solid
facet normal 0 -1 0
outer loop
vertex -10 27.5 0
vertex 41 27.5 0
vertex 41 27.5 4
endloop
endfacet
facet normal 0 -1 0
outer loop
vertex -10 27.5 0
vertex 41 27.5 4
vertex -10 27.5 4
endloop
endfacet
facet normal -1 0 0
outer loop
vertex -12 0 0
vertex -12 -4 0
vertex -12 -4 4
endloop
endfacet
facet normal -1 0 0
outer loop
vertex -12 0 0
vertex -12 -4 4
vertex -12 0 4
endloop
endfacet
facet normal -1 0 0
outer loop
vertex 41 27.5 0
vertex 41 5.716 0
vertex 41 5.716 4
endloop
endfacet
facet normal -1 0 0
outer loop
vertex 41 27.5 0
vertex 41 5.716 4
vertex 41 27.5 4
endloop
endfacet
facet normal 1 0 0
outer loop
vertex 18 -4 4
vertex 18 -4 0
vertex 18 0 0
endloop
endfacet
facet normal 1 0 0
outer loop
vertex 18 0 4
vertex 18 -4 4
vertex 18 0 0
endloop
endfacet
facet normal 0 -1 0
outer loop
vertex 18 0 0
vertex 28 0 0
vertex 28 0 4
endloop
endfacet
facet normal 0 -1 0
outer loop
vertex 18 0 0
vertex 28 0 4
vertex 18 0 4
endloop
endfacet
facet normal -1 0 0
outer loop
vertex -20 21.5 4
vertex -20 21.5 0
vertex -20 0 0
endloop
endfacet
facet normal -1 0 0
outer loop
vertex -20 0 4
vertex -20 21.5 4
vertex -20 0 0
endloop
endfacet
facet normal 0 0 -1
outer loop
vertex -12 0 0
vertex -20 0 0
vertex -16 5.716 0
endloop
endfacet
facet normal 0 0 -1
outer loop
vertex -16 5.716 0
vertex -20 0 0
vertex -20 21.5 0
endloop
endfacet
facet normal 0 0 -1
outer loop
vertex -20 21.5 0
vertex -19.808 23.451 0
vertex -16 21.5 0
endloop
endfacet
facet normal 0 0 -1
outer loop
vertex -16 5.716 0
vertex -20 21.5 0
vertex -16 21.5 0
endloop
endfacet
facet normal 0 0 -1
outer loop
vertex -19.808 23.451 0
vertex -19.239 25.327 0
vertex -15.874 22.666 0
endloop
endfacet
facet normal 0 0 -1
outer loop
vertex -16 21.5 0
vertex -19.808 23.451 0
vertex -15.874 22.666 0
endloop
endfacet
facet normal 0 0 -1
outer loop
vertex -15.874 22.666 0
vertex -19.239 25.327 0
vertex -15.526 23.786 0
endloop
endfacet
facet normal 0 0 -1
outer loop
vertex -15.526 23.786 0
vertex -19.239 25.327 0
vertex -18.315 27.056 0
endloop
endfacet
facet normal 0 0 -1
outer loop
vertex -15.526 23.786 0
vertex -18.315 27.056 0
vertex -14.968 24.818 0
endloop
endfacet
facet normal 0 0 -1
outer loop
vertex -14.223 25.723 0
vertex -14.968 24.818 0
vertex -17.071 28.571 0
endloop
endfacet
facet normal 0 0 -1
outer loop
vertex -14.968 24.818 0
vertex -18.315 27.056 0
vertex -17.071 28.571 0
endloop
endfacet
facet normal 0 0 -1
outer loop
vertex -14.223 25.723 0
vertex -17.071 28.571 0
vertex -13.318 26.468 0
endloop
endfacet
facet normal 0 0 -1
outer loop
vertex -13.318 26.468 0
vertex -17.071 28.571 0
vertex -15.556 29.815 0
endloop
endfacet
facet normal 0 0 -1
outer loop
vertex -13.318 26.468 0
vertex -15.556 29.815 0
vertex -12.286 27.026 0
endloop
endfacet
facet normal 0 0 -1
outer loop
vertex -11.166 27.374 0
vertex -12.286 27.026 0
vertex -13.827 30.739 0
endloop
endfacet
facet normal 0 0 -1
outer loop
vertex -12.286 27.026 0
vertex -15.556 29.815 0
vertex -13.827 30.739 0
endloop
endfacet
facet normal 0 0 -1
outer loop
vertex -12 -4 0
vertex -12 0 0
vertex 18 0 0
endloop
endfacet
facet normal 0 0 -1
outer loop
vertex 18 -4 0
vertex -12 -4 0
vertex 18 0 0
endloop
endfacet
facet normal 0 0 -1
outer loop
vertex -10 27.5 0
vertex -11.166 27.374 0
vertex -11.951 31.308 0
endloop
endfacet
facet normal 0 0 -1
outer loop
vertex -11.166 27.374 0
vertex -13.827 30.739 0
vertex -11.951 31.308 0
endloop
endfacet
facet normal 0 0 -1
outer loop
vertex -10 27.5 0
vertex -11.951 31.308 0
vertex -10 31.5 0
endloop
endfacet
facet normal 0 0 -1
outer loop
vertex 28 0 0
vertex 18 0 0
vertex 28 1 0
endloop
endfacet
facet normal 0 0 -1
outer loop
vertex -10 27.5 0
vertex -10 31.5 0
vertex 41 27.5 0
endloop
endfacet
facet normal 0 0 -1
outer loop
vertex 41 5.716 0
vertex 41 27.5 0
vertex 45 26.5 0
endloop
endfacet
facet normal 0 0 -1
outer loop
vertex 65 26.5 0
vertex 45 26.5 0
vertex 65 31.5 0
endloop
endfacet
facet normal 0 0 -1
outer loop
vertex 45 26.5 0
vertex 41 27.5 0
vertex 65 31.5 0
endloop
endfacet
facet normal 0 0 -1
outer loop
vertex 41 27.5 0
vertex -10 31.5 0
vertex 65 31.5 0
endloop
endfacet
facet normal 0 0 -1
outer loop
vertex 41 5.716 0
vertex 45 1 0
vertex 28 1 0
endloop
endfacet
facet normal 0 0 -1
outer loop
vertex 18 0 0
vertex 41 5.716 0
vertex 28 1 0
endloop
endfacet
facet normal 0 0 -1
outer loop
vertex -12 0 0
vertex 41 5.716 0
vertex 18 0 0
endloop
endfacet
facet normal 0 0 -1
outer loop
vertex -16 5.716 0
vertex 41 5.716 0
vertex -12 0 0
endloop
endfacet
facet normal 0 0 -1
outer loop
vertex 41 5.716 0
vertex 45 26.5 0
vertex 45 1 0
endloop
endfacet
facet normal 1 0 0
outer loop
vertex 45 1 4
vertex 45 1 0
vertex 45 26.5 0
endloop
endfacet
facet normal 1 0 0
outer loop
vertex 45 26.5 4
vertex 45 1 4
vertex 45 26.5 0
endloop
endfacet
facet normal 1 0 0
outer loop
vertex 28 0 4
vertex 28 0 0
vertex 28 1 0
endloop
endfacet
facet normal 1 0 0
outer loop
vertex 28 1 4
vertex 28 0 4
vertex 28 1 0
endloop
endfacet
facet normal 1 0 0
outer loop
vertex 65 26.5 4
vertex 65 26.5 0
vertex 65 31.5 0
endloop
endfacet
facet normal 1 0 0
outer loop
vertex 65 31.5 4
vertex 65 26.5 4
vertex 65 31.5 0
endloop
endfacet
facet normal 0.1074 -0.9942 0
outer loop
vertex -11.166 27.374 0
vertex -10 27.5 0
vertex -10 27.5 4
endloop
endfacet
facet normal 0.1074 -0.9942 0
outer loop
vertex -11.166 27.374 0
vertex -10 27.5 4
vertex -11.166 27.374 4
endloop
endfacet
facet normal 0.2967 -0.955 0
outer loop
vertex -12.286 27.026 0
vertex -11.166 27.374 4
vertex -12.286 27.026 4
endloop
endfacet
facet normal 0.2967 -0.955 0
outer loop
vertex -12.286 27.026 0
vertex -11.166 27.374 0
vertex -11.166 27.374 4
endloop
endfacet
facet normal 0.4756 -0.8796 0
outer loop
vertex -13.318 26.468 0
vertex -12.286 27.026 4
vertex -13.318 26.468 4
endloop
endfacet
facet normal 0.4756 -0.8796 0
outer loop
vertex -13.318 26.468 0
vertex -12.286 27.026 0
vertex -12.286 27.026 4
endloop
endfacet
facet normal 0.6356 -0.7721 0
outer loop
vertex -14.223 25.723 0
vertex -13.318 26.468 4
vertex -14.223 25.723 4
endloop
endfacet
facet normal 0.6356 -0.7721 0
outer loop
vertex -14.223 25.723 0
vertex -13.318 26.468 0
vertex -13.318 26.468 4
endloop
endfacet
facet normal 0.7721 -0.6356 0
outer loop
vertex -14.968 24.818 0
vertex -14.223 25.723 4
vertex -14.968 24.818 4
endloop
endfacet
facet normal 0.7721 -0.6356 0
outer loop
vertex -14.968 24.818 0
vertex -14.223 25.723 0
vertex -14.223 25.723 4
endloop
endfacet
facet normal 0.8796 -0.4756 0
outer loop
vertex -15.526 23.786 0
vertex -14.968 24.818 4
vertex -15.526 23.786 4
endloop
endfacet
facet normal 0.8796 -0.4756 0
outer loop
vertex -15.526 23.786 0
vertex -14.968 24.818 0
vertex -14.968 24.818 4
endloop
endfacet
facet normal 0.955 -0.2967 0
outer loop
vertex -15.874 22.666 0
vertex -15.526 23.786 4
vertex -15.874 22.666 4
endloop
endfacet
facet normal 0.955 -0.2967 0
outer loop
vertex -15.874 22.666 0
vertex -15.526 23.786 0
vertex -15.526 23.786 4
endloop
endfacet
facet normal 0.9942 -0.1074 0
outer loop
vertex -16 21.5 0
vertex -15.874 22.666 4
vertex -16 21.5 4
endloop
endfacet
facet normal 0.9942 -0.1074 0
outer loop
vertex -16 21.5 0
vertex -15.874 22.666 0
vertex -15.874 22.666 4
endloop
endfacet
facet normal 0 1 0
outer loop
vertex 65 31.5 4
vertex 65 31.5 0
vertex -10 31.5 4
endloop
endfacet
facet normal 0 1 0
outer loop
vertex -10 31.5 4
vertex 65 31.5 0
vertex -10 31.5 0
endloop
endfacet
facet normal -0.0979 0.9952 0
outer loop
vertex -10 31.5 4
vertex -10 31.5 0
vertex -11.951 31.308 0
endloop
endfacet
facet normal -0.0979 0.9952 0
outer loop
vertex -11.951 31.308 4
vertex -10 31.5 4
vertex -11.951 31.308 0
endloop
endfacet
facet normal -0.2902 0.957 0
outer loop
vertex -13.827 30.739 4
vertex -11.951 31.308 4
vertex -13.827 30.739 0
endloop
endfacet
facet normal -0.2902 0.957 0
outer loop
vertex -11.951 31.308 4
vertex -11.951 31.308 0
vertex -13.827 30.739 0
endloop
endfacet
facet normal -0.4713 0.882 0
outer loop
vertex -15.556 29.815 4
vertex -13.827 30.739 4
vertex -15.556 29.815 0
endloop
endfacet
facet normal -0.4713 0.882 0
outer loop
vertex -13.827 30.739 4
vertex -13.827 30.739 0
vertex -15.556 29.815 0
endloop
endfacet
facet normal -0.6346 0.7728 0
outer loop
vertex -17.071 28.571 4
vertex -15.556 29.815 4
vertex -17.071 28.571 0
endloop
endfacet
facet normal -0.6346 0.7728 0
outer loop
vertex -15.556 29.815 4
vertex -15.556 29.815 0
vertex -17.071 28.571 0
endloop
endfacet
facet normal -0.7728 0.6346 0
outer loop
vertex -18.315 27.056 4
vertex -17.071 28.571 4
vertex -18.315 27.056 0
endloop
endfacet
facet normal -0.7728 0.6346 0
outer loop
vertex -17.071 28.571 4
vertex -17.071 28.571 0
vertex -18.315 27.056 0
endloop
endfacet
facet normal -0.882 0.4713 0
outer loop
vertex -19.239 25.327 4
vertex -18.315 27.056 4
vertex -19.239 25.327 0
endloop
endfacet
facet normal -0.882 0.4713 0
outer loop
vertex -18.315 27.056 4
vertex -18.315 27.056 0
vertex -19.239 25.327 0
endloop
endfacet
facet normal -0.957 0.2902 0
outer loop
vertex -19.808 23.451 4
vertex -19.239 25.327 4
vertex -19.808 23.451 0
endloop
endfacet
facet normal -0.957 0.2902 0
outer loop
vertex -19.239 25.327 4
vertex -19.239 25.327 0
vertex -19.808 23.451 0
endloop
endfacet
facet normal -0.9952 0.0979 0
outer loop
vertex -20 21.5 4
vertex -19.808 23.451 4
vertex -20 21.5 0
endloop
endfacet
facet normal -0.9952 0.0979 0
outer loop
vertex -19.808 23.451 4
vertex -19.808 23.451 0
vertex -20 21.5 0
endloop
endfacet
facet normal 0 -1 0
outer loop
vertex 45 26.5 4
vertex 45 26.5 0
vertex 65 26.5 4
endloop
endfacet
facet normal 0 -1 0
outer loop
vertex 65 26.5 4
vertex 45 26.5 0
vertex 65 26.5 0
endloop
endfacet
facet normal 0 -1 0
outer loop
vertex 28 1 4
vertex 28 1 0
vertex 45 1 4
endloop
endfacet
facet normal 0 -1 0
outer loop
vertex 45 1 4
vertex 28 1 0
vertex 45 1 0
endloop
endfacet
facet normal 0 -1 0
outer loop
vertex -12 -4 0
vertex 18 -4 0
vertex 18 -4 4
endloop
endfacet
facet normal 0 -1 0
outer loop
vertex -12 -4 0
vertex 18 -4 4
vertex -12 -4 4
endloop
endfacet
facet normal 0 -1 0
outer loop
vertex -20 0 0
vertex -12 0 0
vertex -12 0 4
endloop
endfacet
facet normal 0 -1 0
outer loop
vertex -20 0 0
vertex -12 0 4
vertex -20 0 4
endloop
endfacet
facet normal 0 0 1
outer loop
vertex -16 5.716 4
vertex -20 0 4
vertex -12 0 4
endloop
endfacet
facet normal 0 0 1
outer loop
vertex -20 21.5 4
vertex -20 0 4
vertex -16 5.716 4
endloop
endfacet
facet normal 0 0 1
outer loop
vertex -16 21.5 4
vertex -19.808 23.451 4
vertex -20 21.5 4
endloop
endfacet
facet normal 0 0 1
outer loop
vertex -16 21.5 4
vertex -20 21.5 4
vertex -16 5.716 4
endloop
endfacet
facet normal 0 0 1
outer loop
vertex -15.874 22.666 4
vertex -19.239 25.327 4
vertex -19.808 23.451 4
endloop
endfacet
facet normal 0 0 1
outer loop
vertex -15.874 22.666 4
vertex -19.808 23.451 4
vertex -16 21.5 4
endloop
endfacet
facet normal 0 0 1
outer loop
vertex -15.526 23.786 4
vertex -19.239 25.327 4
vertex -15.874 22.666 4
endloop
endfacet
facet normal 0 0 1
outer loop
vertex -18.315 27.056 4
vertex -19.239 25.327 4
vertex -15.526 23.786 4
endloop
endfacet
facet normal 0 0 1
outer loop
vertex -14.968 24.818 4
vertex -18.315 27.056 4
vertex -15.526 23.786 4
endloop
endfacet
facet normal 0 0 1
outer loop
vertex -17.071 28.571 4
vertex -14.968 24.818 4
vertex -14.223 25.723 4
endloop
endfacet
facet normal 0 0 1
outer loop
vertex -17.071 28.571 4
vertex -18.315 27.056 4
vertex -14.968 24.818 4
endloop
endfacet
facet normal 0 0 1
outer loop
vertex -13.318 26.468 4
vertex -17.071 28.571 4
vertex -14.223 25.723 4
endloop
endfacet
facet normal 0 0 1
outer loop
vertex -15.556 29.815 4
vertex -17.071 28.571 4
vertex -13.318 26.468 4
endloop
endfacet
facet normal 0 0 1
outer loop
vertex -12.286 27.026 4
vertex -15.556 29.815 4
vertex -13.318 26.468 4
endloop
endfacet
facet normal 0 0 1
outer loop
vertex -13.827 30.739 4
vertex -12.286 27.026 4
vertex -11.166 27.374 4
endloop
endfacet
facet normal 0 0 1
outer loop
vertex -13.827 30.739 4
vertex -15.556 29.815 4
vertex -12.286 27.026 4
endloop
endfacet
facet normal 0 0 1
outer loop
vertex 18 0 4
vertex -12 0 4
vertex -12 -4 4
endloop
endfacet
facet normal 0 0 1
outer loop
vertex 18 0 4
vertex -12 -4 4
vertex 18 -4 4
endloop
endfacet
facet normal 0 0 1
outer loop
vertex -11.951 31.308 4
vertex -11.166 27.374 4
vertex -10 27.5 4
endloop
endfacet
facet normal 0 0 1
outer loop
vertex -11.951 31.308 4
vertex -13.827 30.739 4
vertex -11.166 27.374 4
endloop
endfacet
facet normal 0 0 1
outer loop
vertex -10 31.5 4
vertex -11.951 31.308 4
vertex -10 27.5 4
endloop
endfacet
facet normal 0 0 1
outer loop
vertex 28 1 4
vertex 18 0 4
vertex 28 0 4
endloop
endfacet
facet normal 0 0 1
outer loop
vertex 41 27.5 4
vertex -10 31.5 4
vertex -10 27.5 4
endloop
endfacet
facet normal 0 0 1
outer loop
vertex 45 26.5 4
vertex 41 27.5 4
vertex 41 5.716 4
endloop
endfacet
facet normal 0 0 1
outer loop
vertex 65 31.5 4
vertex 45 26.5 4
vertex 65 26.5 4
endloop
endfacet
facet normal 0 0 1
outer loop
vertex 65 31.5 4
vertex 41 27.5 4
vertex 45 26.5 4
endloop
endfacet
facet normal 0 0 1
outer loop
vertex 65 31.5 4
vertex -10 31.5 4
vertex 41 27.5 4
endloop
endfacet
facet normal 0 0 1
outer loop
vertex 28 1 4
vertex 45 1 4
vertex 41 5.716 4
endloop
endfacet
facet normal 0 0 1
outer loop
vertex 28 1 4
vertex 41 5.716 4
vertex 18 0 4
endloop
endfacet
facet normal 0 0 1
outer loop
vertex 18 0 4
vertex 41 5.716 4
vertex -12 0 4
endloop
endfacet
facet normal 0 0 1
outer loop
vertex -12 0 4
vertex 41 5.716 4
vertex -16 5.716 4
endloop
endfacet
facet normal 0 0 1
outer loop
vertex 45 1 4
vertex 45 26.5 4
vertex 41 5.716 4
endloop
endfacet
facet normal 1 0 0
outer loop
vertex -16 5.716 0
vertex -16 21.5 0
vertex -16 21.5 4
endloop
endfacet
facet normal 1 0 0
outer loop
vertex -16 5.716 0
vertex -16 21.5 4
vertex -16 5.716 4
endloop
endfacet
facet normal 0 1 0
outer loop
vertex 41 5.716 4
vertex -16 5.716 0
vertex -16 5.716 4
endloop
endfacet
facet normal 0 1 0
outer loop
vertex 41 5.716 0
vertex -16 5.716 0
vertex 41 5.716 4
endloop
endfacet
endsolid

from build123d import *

# Parameters (mm, degrees)
PAD_DEPTH = 4


with BuildPart() as part:
    # Sketch002 → Pad (new body)
    with BuildSketch(Plane.XY):
        with BuildLine():
            Line((65, 31.5), (-10, 31.5))
            ThreePointArc((-10, 31.5), (-17.071068, 28.571068), (-20, 21.5))
            Line((-20, 21.5), (-20, 0))
            Line((-12, 0), (-20, 0))
            Line((-12, -4), (-12, 0))
            Line((18, -4), (-12, -4))
            Line((18, -4), (18, 0))
            Line((28, 0), (18, 0))
            Line((28, 0), (28, 1))
            Line((28, 1), (45, 1))
            Line((45, 1), (45, 26.5))
            Line((45, 26.5), (65, 26.5))
            Line((65, 26.5), (65, 31.5))
        make_face()
        with BuildLine():
            Line((-16, 21.5), (-16, 5.715926))
            Line((-16, 5.715926), (0, 5.715926))
            Line((0, 5.715926), (35, 5.715926))
            Line((35, 5.715926), (41, 5.715926))
            Line((41, 5.715926), (41, 27.5))
            Line((41, 27.5), (-10, 27.5))
            ThreePointArc((-10, 27.5), (-14.223161, 25.723161), (-16, 21.5))
        make_face(mode=Mode.SUBTRACT)
    extrude(amount=PAD_DEPTH)


solid = part.part
